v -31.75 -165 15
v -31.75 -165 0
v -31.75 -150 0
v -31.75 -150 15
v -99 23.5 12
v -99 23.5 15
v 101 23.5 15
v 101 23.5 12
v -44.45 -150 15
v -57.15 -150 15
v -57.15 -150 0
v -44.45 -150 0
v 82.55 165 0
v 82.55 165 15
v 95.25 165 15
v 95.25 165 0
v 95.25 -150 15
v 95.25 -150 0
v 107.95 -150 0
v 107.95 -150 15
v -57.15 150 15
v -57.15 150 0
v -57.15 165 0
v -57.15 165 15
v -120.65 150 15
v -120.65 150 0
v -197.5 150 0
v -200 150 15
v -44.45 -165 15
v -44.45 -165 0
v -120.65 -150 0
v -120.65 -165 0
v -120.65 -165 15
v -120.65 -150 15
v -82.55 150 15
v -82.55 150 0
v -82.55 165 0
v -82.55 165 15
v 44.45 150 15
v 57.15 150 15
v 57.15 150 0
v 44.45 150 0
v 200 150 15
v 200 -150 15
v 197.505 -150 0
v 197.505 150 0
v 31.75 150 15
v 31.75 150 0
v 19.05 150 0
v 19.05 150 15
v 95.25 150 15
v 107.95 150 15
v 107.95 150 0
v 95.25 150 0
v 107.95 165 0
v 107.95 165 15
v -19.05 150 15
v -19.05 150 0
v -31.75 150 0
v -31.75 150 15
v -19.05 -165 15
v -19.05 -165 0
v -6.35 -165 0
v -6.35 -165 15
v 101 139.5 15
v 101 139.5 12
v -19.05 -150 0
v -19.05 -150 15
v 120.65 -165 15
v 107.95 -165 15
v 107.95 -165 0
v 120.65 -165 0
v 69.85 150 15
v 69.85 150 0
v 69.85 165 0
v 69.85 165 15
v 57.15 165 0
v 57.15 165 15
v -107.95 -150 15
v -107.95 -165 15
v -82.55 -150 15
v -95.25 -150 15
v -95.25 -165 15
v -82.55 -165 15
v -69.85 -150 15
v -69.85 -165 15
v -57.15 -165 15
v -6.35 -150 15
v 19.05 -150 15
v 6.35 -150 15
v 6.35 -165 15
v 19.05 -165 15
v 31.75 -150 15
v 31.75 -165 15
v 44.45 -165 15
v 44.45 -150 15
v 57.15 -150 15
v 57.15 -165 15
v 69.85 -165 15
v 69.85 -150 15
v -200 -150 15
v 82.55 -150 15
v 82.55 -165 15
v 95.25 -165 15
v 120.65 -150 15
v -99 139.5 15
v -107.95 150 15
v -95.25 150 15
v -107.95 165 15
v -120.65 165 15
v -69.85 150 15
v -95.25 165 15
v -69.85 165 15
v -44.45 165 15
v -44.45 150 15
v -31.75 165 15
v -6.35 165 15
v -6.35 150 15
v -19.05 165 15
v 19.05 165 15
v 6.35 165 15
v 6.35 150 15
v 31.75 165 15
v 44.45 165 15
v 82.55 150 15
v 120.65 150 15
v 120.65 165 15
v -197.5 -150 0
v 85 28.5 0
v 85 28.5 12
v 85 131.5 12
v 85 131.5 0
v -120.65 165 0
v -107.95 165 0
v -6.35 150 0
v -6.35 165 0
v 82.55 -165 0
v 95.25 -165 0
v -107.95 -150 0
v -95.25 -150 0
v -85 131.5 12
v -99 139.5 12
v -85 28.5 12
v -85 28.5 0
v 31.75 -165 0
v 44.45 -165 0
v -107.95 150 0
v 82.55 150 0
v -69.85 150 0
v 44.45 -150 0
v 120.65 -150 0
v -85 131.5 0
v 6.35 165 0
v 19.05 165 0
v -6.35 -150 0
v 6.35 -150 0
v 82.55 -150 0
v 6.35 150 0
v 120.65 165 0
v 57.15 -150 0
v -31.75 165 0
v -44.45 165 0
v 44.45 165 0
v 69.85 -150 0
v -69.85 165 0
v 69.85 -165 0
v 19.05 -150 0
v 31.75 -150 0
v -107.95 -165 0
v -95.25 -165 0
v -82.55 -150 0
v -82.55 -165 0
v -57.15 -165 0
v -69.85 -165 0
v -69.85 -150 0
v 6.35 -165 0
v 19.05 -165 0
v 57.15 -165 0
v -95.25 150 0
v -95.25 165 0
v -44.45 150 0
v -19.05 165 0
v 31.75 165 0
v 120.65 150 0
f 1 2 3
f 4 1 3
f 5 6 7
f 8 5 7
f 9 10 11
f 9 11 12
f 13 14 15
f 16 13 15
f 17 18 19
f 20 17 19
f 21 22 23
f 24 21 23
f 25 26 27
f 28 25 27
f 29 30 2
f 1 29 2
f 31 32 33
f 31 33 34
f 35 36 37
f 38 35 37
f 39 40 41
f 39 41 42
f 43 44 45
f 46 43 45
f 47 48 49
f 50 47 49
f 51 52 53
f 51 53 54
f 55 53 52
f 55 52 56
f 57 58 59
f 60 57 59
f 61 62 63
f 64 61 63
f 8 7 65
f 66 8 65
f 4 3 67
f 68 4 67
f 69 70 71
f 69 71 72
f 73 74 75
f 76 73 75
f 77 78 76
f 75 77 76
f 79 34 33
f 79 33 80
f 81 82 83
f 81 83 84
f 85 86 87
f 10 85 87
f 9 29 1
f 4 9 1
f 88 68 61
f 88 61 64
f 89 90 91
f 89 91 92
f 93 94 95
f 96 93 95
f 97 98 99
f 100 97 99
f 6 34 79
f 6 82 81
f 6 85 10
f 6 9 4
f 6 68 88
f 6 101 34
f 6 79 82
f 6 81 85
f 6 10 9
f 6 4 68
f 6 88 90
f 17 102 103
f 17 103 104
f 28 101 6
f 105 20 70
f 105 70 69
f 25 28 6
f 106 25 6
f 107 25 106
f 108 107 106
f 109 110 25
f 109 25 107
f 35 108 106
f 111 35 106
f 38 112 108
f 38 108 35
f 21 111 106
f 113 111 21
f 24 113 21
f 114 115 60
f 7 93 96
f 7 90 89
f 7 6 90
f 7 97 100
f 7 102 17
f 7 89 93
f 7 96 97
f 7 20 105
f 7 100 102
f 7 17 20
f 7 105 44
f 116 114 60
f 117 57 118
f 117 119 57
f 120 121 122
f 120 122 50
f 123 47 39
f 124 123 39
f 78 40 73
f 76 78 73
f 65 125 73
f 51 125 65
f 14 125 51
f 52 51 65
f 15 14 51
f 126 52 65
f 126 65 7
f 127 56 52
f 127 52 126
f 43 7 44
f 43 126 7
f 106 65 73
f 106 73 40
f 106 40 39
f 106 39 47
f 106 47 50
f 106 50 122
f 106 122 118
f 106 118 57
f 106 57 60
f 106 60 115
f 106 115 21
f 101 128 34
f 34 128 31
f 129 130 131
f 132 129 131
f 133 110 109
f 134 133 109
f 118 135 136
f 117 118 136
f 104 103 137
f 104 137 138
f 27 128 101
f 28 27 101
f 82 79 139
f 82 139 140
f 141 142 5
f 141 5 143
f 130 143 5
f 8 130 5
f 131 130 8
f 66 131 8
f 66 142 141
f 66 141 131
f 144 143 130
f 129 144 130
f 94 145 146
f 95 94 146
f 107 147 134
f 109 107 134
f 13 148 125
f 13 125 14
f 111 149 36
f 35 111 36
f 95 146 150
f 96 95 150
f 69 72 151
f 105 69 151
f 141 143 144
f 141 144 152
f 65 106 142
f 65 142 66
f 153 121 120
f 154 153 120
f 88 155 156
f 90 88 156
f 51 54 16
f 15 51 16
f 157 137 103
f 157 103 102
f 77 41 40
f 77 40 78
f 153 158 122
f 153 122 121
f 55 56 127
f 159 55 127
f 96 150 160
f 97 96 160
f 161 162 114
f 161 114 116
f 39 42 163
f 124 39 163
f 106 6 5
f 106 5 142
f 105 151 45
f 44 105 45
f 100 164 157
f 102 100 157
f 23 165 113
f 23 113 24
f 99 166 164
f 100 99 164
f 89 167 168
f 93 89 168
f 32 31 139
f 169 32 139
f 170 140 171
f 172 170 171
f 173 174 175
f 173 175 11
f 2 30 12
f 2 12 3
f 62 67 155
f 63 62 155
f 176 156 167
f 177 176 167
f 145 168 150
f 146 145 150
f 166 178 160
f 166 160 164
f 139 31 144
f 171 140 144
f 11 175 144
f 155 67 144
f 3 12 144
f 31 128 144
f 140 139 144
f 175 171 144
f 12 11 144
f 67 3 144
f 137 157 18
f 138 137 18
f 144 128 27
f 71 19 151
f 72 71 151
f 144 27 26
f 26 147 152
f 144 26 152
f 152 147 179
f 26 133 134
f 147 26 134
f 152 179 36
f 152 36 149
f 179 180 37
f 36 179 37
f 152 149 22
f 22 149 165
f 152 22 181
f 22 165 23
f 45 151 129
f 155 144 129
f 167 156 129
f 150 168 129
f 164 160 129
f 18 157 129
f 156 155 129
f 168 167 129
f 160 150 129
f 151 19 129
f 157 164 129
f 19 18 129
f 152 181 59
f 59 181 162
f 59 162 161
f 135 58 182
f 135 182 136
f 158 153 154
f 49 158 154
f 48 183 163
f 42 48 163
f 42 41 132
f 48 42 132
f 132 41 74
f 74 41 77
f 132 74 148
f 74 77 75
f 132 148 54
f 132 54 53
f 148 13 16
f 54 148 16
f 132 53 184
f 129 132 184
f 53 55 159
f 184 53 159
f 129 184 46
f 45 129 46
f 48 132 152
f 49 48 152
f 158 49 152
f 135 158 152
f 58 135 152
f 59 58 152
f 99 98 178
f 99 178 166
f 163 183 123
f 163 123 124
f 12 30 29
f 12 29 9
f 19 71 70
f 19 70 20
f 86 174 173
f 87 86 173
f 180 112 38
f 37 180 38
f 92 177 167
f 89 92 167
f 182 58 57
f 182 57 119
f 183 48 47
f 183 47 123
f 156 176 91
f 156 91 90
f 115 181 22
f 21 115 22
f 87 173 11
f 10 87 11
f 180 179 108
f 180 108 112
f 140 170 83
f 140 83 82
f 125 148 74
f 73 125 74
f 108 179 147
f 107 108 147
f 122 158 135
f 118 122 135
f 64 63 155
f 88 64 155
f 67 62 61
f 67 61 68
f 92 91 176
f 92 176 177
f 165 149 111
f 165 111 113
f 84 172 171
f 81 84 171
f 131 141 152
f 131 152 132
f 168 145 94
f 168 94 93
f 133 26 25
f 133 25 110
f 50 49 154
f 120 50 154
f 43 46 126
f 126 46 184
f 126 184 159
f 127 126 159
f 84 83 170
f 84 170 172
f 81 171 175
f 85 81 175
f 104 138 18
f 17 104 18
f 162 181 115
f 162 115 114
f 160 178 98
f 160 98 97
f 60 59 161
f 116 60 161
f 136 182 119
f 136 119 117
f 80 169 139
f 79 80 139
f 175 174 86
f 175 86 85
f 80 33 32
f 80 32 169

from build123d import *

# Parameters (mm, degrees)
F0_W     = 12.7
F0_H     = 15
F1_DEPTH = 15
F3_DEPTH = 315.001
F5_DEPTH = 315.001
F6_W     = 170
F6_H     = 103
F7_DEPTH = 15
F8_W     = 200
F8_H     = 116
F8_W_2   = 170
F8_H_2   = 103
F9_DEPTH = 3


with BuildPart() as f1:
    # F0 (on Top) → F1 (new body)
    with BuildSketch(Plane.XY):
        Polygon((120.65, -150), (200, -150), (200, 150), (120.65, 150), (107.95, 150), (95.25, 150), (82.55, 150), (69.85, 150), (57.15, 150), (44.45, 150), (31.75, 150), (19.05, 150), (6.35, 150), (0, 150), (-6.35, 150), (-19.05, 150), (-31.75, 150), (-44.45, 150), (-57.15, 150), (-69.85, 150), (-82.55, 150), (-95.25, 150), (-107.95, 150), (-120.65, 150), (-200, 150), (-200, -150), (-120.65, -150), (-107.95, -150), (-95.25, -150), (-82.55, -150), (-69.85, -150), (-57.15, -150), (-44.45, -150), (-31.75, -150), (-19.05, -150), (-6.35, -150), (0, -150), (6.35, -150), (19.05, -150), (31.75, -150), (44.45, -150), (57.15, -150), (69.85, -150), (82.55, -150), (95.25, -150), (107.95, -150), align=None)
        with Locations((-38.1, -157.5)):
            Rectangle(F0_W, F0_H)
        with Locations((114.3, 157.5)):
            Rectangle(F0_W, F0_H)
        with Locations((-114.3, -157.5)):
            Rectangle(F0_W, F0_H)
        with Locations((114.3, -157.5)):
            Rectangle(F0_W, F0_H)
        with Locations((12.7, -157.5)):
            Rectangle(F0_W, F0_H)
        with Locations((63.5, -157.5)):
            Rectangle(F0_W, F0_H)
        with Locations((-63.5, -157.5)):
            Rectangle(F0_W, F0_H)
        with Locations((-63.5, 157.5)):
            Rectangle(F0_W, F0_H)
        with Locations((12.7, 157.5)):
            Rectangle(F0_W, F0_H)
        with Locations((-88.9, 157.5)):
            Rectangle(F0_W, F0_H)
        with Locations((-88.9, -157.5)):
            Rectangle(F0_W, F0_H)
        with Locations((38.1, 157.5)):
            Rectangle(F0_W, F0_H)
        with Locations((88.9, -157.5)):
            Rectangle(F0_W, F0_H)
        with Locations((38.1, -157.5)):
            Rectangle(F0_W, F0_H)
        with Locations((-38.1, 157.5)):
            Rectangle(F0_W, F0_H)
        with Locations((-114.3, 157.5)):
            Rectangle(F0_W, F0_H)
        with Locations((88.9, 157.5)):
            Rectangle(F0_W, F0_H)
        with Locations((63.5, 157.5)):
            Rectangle(F0_W, F0_H)
        with Locations((-12.7, 157.5)):
            Rectangle(F0_W, F0_H)
        with Locations((-12.7, -157.5)):
            Rectangle(F0_W, F0_H)
    extrude(amount=F1_DEPTH)

    # F2 (on face) → F3 (cut, through all)
    with BuildSketch(Plane.XZ.offset(150)):
        Polygon((-200, 0), (-197.500259, 0), (-200, 15), align=None)
    extrude(amount=-F3_DEPTH, mode=Mode.SUBTRACT)

    # F4 (on face) → F5 (cut, through all)
    with BuildSketch(Plane.XZ.offset(150)):
        Polygon((200, 15), (197.505116, 0), (200, 0), align=None)
    extrude(amount=-F5_DEPTH, mode=Mode.SUBTRACT)

    # F6 (on face) → F7 (cut)
    with BuildSketch(Plane.XY.offset(15)):
        with Locations((0, 80)):
            Rectangle(F6_W, F6_H)
    extrude(amount=-F7_DEPTH, mode=Mode.SUBTRACT)

    # F8 (on face) → F9 (cut)
    with BuildSketch(Plane.XY.offset(15)):
        with Locations((1, 81.5)):
            Rectangle(F8_W, F8_H)
        with Locations((0, 80)):
            Rectangle(F8_W_2, F8_H_2, mode=Mode.SUBTRACT)
    extrude(amount=-F9_DEPTH, mode=Mode.SUBTRACT)


solid = f1.part
